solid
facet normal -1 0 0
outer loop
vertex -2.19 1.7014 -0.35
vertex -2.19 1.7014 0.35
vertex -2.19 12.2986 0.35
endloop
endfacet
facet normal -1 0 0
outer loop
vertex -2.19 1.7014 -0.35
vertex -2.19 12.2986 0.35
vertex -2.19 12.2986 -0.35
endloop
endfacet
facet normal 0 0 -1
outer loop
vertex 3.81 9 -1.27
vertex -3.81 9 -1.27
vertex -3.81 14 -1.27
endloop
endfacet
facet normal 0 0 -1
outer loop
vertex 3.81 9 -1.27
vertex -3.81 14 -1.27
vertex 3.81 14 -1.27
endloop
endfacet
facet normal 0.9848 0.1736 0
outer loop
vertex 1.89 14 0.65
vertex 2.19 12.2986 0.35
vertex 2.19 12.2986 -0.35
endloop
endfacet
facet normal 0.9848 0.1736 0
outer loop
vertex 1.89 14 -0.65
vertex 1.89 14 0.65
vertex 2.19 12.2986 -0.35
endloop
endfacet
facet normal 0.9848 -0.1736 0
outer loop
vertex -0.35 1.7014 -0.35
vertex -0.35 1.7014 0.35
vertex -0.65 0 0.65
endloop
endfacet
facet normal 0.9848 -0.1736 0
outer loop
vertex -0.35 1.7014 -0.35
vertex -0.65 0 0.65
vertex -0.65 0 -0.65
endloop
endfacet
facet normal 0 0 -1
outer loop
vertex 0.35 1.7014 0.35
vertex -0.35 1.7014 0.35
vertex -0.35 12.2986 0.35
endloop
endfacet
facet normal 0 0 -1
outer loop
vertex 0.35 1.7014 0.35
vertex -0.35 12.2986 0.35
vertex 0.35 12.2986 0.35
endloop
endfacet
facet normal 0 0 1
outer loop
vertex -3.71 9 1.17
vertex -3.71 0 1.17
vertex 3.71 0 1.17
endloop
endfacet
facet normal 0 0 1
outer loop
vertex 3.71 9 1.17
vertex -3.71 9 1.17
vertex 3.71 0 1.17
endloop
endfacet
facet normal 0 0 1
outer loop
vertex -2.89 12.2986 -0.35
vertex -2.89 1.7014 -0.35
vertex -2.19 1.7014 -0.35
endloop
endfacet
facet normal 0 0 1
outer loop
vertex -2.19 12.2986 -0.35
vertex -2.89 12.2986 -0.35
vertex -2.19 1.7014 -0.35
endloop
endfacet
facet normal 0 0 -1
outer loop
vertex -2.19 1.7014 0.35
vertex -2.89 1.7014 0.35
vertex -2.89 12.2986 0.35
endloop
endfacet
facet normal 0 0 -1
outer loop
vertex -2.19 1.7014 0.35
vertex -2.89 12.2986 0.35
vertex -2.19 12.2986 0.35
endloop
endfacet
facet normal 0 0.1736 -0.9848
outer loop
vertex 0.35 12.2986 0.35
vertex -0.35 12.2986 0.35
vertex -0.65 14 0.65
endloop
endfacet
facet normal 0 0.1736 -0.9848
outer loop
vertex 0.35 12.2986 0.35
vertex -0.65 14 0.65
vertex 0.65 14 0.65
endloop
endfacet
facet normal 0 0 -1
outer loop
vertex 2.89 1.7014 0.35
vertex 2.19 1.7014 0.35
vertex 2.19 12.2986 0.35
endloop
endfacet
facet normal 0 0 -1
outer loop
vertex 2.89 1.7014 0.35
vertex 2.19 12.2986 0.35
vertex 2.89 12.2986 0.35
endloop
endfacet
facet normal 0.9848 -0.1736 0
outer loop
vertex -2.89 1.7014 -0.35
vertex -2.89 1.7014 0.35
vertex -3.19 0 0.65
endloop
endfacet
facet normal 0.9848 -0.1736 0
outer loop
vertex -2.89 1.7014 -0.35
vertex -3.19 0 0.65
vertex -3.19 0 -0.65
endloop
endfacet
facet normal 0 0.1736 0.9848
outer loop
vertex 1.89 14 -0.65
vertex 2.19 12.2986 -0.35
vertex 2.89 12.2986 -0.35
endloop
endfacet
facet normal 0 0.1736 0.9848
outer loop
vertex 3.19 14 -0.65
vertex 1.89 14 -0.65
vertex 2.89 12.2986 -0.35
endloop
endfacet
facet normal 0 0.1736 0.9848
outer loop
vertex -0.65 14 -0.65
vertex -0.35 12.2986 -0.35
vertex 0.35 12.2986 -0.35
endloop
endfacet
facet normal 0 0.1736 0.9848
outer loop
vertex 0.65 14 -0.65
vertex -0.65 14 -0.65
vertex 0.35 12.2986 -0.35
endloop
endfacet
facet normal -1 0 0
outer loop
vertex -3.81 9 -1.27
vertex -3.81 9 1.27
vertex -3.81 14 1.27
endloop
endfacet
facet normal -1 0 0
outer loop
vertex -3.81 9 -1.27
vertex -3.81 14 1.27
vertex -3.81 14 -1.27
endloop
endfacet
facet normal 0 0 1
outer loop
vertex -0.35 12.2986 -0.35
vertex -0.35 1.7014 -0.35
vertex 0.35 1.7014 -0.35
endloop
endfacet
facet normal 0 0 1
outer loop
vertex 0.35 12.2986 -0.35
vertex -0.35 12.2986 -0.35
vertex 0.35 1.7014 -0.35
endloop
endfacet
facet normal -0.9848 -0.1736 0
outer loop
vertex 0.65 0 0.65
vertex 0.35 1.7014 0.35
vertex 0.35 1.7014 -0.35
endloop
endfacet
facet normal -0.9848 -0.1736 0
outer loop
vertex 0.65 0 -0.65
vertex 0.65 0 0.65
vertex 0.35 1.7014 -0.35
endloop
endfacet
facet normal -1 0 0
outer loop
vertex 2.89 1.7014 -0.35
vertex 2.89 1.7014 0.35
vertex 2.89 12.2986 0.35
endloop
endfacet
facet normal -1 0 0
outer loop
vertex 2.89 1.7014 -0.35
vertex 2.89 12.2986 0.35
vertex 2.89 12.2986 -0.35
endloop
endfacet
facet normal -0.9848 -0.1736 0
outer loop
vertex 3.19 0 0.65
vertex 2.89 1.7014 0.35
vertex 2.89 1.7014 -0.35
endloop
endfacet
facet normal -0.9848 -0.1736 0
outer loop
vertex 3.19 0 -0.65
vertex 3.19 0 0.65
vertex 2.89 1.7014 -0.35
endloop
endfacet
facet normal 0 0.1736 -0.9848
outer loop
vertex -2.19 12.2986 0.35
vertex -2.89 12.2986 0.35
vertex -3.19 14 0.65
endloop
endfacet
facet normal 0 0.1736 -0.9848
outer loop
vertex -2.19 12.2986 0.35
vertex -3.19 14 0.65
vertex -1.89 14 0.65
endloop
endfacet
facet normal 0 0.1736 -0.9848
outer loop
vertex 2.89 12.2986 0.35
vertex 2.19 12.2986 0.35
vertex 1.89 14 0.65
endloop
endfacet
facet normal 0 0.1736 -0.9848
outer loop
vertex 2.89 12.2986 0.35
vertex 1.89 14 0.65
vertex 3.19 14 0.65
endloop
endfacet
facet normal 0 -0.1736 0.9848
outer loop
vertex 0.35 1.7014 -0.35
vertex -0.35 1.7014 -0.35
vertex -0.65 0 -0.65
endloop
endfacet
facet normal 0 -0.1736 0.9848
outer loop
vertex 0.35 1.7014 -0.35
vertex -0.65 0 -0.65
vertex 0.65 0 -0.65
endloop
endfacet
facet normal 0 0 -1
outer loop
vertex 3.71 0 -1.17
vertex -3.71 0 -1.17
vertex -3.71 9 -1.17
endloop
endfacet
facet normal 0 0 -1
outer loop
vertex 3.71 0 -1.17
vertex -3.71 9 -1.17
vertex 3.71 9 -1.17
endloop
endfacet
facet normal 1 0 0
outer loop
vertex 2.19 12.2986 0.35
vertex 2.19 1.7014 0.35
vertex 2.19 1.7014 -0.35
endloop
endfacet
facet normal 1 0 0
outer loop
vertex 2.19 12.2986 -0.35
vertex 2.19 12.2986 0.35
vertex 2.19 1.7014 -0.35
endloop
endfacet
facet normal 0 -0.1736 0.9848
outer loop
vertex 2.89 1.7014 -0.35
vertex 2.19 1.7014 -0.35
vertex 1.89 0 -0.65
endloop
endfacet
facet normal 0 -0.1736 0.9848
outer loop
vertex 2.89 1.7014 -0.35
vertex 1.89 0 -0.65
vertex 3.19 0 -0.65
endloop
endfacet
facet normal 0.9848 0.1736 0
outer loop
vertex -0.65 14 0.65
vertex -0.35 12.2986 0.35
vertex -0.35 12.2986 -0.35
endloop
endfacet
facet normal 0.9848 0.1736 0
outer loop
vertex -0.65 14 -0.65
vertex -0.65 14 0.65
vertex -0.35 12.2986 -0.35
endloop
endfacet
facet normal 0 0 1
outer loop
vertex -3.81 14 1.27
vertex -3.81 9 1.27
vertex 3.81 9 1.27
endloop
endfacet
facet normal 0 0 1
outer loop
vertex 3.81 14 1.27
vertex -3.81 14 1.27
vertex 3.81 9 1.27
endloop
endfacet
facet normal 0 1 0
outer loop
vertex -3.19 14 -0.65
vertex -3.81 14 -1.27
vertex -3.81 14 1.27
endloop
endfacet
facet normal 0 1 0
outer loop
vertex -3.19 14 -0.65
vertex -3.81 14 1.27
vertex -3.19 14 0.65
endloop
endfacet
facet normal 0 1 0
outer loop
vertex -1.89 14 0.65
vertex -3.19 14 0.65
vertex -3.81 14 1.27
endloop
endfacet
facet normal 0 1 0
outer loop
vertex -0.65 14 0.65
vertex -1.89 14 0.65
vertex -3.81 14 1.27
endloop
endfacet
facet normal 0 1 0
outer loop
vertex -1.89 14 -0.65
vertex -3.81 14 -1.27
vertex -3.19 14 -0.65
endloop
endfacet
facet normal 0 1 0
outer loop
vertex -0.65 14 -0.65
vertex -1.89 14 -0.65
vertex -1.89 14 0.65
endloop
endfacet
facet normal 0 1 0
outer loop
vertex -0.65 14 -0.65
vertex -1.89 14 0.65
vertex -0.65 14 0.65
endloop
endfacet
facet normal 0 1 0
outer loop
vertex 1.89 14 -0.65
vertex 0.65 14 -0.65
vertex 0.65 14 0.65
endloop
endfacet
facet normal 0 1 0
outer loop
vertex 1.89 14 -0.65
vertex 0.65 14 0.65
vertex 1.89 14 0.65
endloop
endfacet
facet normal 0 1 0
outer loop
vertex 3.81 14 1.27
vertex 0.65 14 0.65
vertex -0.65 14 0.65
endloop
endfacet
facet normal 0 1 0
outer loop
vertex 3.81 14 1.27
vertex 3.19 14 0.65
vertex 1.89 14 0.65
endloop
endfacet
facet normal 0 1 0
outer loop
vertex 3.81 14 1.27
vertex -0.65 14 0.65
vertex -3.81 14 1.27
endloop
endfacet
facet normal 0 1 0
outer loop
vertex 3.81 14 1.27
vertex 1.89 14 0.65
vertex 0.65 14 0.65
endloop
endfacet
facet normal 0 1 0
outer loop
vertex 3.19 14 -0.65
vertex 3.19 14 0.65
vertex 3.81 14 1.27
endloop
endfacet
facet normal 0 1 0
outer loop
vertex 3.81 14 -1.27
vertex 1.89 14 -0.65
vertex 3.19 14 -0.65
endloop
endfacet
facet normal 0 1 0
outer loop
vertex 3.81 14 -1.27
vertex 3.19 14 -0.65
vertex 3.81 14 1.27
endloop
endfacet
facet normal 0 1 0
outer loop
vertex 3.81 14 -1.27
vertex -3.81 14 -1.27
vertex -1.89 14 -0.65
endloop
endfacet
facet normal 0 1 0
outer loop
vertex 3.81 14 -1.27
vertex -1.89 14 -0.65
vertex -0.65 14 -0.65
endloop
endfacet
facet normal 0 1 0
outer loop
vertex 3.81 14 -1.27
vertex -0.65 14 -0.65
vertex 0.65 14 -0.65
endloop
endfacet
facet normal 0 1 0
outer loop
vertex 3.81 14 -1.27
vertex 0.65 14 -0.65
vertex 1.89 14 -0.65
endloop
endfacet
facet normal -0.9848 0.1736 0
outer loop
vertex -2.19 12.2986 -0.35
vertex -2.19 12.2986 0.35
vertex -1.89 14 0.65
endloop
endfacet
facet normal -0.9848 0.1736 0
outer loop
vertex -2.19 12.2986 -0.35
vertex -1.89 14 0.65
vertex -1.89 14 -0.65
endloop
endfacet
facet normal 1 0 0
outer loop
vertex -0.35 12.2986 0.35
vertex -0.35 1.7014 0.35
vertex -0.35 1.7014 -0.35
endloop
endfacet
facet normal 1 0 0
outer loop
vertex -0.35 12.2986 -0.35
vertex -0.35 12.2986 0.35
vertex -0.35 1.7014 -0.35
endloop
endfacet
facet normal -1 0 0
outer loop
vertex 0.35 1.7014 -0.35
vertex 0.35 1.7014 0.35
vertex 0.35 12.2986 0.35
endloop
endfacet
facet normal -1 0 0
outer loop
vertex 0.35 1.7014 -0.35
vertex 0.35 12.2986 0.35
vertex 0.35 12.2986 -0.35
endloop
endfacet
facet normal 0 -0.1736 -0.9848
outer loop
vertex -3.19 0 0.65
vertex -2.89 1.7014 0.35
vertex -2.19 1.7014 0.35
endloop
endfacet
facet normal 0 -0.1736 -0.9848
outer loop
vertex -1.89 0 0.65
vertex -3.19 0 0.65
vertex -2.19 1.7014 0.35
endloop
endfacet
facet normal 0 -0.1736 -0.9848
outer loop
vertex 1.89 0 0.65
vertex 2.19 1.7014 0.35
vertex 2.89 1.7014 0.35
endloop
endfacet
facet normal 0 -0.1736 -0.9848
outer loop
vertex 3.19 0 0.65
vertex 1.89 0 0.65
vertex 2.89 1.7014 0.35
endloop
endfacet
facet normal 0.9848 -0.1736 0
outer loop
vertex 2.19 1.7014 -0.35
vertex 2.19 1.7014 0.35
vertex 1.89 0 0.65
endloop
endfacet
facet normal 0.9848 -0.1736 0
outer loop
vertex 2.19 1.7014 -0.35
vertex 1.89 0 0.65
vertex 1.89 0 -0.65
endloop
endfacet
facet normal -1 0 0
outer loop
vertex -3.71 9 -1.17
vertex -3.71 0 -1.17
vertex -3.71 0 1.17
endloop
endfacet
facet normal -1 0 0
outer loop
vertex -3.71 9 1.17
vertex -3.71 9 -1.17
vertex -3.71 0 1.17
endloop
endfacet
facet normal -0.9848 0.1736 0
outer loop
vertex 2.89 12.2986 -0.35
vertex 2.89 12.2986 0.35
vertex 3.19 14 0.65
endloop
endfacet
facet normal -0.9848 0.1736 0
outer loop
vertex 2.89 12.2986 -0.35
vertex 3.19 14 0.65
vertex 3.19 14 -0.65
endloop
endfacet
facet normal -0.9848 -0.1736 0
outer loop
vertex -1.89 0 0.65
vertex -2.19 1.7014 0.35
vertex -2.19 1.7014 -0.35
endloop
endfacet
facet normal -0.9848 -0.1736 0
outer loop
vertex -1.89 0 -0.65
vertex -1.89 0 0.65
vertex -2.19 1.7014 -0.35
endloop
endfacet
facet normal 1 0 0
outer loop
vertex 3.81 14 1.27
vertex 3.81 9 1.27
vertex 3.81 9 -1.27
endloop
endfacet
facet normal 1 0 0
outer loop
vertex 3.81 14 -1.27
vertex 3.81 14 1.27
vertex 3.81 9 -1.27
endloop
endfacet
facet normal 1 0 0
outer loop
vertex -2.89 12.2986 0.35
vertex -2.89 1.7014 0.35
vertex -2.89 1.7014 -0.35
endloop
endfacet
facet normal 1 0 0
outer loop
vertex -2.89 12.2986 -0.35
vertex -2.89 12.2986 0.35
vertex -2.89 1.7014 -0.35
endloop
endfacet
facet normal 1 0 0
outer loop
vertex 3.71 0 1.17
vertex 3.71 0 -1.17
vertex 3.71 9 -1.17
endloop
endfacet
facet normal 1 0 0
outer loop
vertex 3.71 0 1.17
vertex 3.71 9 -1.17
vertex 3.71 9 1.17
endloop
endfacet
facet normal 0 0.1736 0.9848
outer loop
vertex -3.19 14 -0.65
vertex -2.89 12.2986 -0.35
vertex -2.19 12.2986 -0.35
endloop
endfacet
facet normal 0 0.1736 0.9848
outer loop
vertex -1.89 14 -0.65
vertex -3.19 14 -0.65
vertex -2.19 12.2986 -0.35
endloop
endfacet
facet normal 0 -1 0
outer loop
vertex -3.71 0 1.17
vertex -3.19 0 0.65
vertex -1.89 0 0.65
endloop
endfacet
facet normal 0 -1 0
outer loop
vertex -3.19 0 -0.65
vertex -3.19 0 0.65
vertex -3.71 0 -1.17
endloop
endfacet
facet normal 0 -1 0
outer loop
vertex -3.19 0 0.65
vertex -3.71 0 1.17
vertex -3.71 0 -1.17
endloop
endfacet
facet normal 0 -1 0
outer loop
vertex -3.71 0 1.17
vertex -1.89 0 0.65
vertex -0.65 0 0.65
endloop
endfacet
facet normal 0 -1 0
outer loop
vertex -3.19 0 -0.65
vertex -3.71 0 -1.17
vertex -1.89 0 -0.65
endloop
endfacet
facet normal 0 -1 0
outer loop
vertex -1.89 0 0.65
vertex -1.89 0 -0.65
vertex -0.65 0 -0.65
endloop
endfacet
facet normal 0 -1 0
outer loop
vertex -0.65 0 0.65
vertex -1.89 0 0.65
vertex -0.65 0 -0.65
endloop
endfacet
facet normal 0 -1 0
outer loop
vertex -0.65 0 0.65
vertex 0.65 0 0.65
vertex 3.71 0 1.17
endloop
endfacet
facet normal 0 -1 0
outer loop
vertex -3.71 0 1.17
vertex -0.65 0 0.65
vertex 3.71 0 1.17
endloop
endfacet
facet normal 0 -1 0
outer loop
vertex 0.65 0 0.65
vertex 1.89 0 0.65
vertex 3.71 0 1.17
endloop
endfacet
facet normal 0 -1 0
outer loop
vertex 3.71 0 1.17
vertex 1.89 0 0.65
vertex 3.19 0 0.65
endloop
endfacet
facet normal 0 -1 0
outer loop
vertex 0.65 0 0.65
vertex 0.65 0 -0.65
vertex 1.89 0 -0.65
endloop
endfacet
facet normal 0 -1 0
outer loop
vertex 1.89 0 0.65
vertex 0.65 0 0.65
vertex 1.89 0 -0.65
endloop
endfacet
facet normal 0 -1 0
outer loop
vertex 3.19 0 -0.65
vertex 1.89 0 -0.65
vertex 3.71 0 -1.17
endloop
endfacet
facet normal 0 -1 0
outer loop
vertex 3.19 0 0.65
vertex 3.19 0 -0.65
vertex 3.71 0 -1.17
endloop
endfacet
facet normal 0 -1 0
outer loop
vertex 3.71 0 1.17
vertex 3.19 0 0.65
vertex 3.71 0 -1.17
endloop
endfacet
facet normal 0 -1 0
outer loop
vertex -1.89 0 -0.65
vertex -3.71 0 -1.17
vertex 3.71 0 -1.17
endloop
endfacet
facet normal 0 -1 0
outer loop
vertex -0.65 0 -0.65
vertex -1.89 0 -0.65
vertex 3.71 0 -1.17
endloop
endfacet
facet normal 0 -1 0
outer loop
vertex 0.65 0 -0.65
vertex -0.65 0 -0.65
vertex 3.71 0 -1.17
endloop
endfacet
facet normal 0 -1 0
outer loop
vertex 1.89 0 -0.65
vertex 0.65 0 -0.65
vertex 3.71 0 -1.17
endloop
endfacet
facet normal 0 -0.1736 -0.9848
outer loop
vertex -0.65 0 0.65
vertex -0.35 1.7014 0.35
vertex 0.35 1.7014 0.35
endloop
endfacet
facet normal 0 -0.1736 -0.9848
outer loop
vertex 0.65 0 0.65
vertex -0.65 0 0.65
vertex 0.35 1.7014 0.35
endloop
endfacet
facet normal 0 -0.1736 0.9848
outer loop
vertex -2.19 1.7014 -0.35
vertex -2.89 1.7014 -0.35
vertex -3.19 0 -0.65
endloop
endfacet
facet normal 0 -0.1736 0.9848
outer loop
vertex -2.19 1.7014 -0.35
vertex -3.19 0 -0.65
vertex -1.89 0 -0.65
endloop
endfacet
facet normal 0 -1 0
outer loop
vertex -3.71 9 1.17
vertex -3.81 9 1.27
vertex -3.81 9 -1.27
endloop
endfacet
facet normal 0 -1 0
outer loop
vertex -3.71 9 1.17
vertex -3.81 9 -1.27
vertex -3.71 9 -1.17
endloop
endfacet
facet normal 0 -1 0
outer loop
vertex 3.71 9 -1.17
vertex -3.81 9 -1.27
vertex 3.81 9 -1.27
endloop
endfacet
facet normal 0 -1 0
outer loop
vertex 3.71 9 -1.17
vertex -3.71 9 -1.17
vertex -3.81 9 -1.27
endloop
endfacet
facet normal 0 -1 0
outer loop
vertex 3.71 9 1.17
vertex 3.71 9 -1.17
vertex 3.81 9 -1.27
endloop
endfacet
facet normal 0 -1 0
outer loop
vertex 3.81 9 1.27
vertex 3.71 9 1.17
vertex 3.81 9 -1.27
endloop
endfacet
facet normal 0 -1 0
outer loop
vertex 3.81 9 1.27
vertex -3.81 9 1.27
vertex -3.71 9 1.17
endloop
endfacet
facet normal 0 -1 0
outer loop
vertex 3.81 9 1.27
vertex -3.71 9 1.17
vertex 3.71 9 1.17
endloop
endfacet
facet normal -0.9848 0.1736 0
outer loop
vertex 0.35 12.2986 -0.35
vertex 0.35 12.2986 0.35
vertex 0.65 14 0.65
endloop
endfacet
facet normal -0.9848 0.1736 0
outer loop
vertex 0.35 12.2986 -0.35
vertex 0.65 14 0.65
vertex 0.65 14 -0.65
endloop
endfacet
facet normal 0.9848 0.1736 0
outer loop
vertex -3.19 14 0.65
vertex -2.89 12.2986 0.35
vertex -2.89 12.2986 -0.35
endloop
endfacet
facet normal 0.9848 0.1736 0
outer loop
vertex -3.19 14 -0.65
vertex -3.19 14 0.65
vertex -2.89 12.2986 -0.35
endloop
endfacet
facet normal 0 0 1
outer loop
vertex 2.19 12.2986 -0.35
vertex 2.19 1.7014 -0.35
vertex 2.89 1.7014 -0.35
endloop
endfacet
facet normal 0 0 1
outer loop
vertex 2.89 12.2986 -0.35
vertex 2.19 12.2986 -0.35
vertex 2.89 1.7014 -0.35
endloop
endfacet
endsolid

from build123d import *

# Parameters (mm, degrees)
SKIZZE1_W                       = 7.62
SKIZZE1_H                       = 2.54
SKIZZE1_W_2                     = 0.7
SKIZZE1_H_2                     = 0.7
AUFSATZ_LINEAR_AUSTRAGEN1_DEPTH = 14
SKIZZE3_OUTSIDE_W               = 12.848
SKIZZE3_OUTSIDE_H               = 7.768
SKIZZE3_OUTSIDE_W_2             = 7.42
SKIZZE3_OUTSIDE_H_2             = 2.34
SCHNITT_LINEAR_AUSTRAGEN1_DEPTH = 9
FASE1_SIZE                      = 0.3
FASE1_SIZE2                     = 1.701384546
FASE1_PART_2_SIZE               = 0.3
FASE1_PART_2_SIZE2              = 1.701384546


with BuildPart() as part:
    # Skizze1 → Aufsatz-Linear austragen1 (new body)
    with BuildSketch(Plane(origin=(0, 0, 0), x_dir=(1, 0, 0), z_dir=(0, 1, 0))):
        Rectangle(SKIZZE1_W, SKIZZE1_H)
        with Locations((-2.54, 0)):
            Rectangle(SKIZZE1_W_2, SKIZZE1_H_2, mode=Mode.SUBTRACT)
        Rectangle(SKIZZE1_W_2, SKIZZE1_H_2, mode=Mode.SUBTRACT)
        with Locations((2.54, 0)):
            Rectangle(SKIZZE1_W_2, SKIZZE1_H_2, mode=Mode.SUBTRACT)
    extrude(amount=AUFSATZ_LINEAR_AUSTRAGEN1_DEPTH)

    # Skizze3 outside → Schnitt-Linear austragen1 (cut)
    with BuildSketch(Plane.XZ):
        Rectangle(SKIZZE3_OUTSIDE_W, SKIZZE3_OUTSIDE_H)
        Rectangle(SKIZZE3_OUTSIDE_W_2, SKIZZE3_OUTSIDE_H_2, mode=Mode.SUBTRACT)
    extrude(amount=-SCHNITT_LINEAR_AUSTRAGEN1_DEPTH, mode=Mode.SUBTRACT)

    # Fase1
    fase1_edges = [part.edges().sort_by_distance(p)[0] for p in [
        (-2.89, 0, 0),
        (-2.54, 0, 0.35),
        (-2.19, 0, 0),
        (-2.54, 0, -0.35),
        (-0.35, 0, 0),
        (0, 0, 0.35),
        (0.35, 0, 0),
        (0, 0, -0.35),
        (2.19, 0, 0),
        (2.54, 0, 0.35),
        (2.89, 0, 0),
        (2.54, 0, -0.35),
    ]]
    fase1_side = [part.faces().sort_by_distance(p)[0] for p in [
        (0, 0, -1.092197686),
    ]]
    chamfer(fase1_edges, length=FASE1_SIZE, length2=FASE1_SIZE2, reference=fase1_side[0])

    # Fase1 part 2
    fase1_part_2_edges = [part.edges().sort_by_distance(p)[0] for p in [
        (-2.89, 14, 0),
        (-2.54, 14, 0.35),
        (-2.19, 14, 0),
        (-2.54, 14, -0.35),
        (-0.35, 14, 0),
        (0, 14, 0.35),
        (0.35, 14, 0),
        (0, 14, -0.35),
        (2.19, 14, 0),
        (2.54, 14, 0.35),
        (2.89, 14, 0),
        (2.54, 14, -0.35),
    ]]
    fase1_part_2_side = [part.faces().sort_by_distance(p)[0] for p in [
        (0, 14, 1.189678147),
    ]]
    chamfer(fase1_part_2_edges, length=FASE1_PART_2_SIZE, length2=FASE1_PART_2_SIZE2, reference=fase1_part_2_side[0])


solid = part.part
